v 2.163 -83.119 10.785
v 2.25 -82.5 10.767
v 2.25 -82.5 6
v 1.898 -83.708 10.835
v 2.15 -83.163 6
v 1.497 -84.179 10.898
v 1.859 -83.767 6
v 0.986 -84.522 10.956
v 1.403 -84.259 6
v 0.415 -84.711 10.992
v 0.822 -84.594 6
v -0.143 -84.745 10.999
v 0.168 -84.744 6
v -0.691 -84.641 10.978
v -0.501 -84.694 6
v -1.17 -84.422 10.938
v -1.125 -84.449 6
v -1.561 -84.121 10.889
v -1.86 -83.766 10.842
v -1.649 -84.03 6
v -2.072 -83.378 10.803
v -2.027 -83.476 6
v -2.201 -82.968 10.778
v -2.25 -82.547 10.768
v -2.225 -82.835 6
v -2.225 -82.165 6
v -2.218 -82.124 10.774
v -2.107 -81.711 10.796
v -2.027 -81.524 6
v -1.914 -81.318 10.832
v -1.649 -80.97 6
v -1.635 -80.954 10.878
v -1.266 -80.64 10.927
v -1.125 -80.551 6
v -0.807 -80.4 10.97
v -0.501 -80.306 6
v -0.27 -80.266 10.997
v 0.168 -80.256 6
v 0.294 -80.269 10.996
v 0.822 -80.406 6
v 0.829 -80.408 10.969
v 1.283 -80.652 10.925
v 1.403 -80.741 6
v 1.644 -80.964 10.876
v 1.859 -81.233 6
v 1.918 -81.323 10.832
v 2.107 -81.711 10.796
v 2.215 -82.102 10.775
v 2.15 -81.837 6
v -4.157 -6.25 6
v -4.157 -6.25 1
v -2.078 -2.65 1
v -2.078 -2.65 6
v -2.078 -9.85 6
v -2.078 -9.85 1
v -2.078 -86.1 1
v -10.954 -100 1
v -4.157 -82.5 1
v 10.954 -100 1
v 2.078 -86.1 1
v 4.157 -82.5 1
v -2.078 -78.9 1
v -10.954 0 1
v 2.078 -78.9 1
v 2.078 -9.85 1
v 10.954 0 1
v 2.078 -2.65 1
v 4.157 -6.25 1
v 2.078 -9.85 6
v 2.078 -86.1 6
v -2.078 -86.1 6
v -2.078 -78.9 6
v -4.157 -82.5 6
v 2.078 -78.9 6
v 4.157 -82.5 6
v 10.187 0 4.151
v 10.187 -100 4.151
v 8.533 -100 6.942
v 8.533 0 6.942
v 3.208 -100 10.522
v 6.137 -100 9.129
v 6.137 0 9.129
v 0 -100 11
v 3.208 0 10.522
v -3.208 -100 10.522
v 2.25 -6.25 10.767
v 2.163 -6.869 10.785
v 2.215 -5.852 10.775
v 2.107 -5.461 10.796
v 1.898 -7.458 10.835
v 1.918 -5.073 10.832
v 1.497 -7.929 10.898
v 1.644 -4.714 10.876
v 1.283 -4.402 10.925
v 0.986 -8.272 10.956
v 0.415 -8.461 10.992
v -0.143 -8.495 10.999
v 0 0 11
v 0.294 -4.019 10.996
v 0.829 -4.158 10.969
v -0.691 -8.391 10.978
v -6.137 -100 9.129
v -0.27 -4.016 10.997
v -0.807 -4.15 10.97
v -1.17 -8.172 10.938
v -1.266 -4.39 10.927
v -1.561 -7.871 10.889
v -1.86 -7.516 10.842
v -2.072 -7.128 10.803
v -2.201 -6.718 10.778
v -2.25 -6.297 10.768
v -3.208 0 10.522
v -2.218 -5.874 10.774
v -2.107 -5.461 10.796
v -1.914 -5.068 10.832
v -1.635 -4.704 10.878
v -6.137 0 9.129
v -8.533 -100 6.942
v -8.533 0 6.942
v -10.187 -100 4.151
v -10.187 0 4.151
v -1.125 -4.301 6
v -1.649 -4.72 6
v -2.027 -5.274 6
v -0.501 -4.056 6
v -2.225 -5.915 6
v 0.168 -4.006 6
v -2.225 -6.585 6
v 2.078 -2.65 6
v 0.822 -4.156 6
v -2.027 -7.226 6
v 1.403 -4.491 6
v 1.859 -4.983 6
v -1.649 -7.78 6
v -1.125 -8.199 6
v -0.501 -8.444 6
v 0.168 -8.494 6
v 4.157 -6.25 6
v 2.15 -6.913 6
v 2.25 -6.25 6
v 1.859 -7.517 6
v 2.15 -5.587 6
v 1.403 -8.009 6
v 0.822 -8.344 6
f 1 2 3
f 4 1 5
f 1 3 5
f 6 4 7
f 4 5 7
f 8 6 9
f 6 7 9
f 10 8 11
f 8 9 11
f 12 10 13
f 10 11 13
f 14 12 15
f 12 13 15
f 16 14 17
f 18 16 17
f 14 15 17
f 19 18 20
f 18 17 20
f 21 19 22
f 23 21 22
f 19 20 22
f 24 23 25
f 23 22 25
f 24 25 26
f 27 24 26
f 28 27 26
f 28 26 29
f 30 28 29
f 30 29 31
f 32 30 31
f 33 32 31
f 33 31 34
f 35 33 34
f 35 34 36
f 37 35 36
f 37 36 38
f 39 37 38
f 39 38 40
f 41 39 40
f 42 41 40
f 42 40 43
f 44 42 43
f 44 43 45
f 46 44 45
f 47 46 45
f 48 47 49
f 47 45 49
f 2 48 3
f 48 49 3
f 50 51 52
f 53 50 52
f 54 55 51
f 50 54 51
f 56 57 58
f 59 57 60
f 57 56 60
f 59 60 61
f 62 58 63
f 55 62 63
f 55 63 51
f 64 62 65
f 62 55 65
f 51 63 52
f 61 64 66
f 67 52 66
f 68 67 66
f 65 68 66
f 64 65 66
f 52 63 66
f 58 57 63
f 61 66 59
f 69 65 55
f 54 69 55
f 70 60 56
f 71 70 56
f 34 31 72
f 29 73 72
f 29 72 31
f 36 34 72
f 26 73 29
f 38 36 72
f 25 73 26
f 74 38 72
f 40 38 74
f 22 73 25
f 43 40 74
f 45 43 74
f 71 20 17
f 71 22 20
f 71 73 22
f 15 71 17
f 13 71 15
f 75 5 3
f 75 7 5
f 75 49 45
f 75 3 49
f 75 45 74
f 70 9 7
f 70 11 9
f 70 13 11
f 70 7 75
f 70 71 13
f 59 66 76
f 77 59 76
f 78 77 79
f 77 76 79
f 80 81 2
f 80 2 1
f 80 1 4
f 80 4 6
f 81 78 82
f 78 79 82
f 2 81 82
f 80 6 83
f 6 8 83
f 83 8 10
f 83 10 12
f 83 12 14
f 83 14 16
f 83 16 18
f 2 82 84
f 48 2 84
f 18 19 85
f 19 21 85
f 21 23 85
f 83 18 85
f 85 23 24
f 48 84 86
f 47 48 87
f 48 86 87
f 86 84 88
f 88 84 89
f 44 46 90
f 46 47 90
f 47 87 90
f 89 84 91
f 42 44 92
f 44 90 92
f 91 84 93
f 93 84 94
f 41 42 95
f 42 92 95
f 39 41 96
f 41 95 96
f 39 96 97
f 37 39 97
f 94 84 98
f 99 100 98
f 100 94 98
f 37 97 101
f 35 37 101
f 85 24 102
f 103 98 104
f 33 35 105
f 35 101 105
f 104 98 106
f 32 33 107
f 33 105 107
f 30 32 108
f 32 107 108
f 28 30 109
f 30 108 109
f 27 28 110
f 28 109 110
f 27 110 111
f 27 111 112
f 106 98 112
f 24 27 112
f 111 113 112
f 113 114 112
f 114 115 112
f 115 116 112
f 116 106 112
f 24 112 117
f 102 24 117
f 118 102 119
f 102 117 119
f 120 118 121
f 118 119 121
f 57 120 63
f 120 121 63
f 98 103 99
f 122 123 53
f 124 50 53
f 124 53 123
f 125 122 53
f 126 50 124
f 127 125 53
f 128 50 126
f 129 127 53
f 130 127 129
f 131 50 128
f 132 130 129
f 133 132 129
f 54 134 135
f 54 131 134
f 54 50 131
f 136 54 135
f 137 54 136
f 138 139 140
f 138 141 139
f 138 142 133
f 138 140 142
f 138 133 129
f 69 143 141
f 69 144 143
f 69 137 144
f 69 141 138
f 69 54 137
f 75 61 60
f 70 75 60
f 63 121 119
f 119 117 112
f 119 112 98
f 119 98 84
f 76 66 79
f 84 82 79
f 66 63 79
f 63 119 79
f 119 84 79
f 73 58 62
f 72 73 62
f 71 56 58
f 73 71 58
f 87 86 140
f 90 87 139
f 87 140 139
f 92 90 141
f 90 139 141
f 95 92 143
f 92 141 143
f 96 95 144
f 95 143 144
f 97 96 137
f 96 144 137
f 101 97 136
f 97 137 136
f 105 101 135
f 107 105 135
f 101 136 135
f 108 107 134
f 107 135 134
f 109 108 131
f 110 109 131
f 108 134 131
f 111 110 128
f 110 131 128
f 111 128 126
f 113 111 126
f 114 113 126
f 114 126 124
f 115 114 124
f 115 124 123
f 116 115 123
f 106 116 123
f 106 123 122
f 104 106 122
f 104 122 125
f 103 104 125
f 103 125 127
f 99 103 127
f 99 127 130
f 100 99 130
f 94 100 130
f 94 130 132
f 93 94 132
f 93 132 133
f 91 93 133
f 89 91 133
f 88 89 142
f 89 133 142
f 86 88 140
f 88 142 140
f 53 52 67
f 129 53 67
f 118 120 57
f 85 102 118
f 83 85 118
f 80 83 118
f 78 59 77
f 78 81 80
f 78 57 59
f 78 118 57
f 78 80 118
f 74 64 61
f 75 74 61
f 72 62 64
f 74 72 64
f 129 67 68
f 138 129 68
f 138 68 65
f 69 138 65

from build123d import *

# Parameters (mm, degrees)
F1_DEPTH = 100
F2_R     = 2.25
F3_DEPTH = 5
F4_DEPTH = 25


with BuildPart() as f1:
    # F0 (on Front) → F1 (new body)
    with BuildSketch(Plane.XZ):
        with BuildLine():
            ThreePointArc((10.9544511501, 1), (0, 11), (-10.9544511501, 1))
            Line((-10.9544511501, 1), (10.9544511501, 1))
        make_face()
    extrude(amount=F1_DEPTH)

    # F2 (on face) → F3 (cut)
    with BuildSketch(Plane(origin=(0, 0, 1), x_dir=(1, 0, 0), z_dir=(0, 0, -1))):
        Polygon((-2.0784609691, 2.65), (2.0784609691, 2.65), (4.1569219382, 6.25), (2.0784609691, 9.85), (-2.0784609691, 9.85), (-4.1569219382, 6.25), align=None)
        with Locations((0, 6.25)):
            Circle(F2_R, mode=Mode.SUBTRACT)
        Polygon((-2.0784609691, 78.9), (2.0784609691, 78.9), (4.1569219382, 82.5), (2.0784609691, 86.1), (-2.0784609691, 86.1), (-4.1569219382, 82.5), align=None)
        with Locations((0, 82.5)):
            Circle(F2_R, mode=Mode.SUBTRACT)
    extrude(amount=-F3_DEPTH, mode=Mode.SUBTRACT)

    # F4 (cut): faces of the model
    f4_faces = [f1.faces().sort_by_distance(p)[0] for p in [
        (0, -82.5, 1),
        (0, -6.25, 1),
    ]]
    extrude(f4_faces, amount=-F4_DEPTH, mode=Mode.SUBTRACT)


solid = f1.part
